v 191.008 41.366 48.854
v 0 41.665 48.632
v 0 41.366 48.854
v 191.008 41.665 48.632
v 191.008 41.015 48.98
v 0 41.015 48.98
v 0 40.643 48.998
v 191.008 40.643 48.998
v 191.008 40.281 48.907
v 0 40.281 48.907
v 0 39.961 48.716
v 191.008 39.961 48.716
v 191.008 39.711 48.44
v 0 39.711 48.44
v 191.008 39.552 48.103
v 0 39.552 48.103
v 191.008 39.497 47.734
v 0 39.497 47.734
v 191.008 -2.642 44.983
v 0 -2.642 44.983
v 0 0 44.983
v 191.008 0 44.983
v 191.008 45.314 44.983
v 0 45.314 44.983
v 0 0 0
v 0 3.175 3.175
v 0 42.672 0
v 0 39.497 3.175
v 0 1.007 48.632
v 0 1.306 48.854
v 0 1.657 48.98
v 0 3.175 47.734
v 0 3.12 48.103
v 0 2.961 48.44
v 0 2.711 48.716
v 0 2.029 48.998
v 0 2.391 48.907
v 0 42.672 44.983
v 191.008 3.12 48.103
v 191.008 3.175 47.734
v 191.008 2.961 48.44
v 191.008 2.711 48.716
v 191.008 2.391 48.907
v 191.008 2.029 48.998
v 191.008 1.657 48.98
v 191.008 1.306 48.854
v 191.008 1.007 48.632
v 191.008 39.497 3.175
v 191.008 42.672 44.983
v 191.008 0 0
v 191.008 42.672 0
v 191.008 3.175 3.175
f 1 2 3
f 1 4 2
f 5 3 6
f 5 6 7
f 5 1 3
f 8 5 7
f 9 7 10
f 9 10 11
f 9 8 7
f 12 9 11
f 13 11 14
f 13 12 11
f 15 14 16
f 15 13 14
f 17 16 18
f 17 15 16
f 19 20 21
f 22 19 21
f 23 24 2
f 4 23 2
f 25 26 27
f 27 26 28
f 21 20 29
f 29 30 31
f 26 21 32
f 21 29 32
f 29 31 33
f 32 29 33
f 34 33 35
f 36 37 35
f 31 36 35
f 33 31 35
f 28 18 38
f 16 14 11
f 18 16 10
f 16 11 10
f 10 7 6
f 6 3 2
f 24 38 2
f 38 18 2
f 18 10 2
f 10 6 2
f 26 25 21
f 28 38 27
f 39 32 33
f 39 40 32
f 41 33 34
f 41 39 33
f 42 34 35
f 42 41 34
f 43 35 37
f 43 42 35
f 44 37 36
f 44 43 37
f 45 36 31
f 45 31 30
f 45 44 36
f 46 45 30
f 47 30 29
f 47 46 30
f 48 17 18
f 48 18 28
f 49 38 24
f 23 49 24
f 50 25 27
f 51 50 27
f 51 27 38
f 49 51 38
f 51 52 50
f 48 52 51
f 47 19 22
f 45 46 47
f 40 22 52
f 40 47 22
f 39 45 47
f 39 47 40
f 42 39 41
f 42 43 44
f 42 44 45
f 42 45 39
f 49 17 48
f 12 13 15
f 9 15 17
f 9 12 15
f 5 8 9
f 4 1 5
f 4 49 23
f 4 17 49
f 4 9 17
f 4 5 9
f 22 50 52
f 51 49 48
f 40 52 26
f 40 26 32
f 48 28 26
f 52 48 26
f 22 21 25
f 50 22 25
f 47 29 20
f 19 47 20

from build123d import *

# Parameters (mm, degrees)
F1_DEPTH = 191.008
F2_R     = 1.27


with BuildPart() as f1:
    # F0 (on Right) → F1 (new body)
    with BuildSketch(Plane.YZ):
        Polygon((0, 44.9834), (0, 0), (42.672, 0), (42.672, 44.9834), (45.3136, 44.9834), (39.497, 50.8), (39.497, 3.175), (3.175, 3.175), (3.175, 50.8), (-2.6416, 44.9834), align=None)
    extrude(amount=F1_DEPTH)

    # F2
    f2_edges = [f1.edges().sort_by_distance(p)[0] for p in [
        (95.504, 3.175, 50.8),
        (95.504, 39.497, 50.8),
    ]]
    fillet(f2_edges, radius=F2_R)


solid = f1.part
